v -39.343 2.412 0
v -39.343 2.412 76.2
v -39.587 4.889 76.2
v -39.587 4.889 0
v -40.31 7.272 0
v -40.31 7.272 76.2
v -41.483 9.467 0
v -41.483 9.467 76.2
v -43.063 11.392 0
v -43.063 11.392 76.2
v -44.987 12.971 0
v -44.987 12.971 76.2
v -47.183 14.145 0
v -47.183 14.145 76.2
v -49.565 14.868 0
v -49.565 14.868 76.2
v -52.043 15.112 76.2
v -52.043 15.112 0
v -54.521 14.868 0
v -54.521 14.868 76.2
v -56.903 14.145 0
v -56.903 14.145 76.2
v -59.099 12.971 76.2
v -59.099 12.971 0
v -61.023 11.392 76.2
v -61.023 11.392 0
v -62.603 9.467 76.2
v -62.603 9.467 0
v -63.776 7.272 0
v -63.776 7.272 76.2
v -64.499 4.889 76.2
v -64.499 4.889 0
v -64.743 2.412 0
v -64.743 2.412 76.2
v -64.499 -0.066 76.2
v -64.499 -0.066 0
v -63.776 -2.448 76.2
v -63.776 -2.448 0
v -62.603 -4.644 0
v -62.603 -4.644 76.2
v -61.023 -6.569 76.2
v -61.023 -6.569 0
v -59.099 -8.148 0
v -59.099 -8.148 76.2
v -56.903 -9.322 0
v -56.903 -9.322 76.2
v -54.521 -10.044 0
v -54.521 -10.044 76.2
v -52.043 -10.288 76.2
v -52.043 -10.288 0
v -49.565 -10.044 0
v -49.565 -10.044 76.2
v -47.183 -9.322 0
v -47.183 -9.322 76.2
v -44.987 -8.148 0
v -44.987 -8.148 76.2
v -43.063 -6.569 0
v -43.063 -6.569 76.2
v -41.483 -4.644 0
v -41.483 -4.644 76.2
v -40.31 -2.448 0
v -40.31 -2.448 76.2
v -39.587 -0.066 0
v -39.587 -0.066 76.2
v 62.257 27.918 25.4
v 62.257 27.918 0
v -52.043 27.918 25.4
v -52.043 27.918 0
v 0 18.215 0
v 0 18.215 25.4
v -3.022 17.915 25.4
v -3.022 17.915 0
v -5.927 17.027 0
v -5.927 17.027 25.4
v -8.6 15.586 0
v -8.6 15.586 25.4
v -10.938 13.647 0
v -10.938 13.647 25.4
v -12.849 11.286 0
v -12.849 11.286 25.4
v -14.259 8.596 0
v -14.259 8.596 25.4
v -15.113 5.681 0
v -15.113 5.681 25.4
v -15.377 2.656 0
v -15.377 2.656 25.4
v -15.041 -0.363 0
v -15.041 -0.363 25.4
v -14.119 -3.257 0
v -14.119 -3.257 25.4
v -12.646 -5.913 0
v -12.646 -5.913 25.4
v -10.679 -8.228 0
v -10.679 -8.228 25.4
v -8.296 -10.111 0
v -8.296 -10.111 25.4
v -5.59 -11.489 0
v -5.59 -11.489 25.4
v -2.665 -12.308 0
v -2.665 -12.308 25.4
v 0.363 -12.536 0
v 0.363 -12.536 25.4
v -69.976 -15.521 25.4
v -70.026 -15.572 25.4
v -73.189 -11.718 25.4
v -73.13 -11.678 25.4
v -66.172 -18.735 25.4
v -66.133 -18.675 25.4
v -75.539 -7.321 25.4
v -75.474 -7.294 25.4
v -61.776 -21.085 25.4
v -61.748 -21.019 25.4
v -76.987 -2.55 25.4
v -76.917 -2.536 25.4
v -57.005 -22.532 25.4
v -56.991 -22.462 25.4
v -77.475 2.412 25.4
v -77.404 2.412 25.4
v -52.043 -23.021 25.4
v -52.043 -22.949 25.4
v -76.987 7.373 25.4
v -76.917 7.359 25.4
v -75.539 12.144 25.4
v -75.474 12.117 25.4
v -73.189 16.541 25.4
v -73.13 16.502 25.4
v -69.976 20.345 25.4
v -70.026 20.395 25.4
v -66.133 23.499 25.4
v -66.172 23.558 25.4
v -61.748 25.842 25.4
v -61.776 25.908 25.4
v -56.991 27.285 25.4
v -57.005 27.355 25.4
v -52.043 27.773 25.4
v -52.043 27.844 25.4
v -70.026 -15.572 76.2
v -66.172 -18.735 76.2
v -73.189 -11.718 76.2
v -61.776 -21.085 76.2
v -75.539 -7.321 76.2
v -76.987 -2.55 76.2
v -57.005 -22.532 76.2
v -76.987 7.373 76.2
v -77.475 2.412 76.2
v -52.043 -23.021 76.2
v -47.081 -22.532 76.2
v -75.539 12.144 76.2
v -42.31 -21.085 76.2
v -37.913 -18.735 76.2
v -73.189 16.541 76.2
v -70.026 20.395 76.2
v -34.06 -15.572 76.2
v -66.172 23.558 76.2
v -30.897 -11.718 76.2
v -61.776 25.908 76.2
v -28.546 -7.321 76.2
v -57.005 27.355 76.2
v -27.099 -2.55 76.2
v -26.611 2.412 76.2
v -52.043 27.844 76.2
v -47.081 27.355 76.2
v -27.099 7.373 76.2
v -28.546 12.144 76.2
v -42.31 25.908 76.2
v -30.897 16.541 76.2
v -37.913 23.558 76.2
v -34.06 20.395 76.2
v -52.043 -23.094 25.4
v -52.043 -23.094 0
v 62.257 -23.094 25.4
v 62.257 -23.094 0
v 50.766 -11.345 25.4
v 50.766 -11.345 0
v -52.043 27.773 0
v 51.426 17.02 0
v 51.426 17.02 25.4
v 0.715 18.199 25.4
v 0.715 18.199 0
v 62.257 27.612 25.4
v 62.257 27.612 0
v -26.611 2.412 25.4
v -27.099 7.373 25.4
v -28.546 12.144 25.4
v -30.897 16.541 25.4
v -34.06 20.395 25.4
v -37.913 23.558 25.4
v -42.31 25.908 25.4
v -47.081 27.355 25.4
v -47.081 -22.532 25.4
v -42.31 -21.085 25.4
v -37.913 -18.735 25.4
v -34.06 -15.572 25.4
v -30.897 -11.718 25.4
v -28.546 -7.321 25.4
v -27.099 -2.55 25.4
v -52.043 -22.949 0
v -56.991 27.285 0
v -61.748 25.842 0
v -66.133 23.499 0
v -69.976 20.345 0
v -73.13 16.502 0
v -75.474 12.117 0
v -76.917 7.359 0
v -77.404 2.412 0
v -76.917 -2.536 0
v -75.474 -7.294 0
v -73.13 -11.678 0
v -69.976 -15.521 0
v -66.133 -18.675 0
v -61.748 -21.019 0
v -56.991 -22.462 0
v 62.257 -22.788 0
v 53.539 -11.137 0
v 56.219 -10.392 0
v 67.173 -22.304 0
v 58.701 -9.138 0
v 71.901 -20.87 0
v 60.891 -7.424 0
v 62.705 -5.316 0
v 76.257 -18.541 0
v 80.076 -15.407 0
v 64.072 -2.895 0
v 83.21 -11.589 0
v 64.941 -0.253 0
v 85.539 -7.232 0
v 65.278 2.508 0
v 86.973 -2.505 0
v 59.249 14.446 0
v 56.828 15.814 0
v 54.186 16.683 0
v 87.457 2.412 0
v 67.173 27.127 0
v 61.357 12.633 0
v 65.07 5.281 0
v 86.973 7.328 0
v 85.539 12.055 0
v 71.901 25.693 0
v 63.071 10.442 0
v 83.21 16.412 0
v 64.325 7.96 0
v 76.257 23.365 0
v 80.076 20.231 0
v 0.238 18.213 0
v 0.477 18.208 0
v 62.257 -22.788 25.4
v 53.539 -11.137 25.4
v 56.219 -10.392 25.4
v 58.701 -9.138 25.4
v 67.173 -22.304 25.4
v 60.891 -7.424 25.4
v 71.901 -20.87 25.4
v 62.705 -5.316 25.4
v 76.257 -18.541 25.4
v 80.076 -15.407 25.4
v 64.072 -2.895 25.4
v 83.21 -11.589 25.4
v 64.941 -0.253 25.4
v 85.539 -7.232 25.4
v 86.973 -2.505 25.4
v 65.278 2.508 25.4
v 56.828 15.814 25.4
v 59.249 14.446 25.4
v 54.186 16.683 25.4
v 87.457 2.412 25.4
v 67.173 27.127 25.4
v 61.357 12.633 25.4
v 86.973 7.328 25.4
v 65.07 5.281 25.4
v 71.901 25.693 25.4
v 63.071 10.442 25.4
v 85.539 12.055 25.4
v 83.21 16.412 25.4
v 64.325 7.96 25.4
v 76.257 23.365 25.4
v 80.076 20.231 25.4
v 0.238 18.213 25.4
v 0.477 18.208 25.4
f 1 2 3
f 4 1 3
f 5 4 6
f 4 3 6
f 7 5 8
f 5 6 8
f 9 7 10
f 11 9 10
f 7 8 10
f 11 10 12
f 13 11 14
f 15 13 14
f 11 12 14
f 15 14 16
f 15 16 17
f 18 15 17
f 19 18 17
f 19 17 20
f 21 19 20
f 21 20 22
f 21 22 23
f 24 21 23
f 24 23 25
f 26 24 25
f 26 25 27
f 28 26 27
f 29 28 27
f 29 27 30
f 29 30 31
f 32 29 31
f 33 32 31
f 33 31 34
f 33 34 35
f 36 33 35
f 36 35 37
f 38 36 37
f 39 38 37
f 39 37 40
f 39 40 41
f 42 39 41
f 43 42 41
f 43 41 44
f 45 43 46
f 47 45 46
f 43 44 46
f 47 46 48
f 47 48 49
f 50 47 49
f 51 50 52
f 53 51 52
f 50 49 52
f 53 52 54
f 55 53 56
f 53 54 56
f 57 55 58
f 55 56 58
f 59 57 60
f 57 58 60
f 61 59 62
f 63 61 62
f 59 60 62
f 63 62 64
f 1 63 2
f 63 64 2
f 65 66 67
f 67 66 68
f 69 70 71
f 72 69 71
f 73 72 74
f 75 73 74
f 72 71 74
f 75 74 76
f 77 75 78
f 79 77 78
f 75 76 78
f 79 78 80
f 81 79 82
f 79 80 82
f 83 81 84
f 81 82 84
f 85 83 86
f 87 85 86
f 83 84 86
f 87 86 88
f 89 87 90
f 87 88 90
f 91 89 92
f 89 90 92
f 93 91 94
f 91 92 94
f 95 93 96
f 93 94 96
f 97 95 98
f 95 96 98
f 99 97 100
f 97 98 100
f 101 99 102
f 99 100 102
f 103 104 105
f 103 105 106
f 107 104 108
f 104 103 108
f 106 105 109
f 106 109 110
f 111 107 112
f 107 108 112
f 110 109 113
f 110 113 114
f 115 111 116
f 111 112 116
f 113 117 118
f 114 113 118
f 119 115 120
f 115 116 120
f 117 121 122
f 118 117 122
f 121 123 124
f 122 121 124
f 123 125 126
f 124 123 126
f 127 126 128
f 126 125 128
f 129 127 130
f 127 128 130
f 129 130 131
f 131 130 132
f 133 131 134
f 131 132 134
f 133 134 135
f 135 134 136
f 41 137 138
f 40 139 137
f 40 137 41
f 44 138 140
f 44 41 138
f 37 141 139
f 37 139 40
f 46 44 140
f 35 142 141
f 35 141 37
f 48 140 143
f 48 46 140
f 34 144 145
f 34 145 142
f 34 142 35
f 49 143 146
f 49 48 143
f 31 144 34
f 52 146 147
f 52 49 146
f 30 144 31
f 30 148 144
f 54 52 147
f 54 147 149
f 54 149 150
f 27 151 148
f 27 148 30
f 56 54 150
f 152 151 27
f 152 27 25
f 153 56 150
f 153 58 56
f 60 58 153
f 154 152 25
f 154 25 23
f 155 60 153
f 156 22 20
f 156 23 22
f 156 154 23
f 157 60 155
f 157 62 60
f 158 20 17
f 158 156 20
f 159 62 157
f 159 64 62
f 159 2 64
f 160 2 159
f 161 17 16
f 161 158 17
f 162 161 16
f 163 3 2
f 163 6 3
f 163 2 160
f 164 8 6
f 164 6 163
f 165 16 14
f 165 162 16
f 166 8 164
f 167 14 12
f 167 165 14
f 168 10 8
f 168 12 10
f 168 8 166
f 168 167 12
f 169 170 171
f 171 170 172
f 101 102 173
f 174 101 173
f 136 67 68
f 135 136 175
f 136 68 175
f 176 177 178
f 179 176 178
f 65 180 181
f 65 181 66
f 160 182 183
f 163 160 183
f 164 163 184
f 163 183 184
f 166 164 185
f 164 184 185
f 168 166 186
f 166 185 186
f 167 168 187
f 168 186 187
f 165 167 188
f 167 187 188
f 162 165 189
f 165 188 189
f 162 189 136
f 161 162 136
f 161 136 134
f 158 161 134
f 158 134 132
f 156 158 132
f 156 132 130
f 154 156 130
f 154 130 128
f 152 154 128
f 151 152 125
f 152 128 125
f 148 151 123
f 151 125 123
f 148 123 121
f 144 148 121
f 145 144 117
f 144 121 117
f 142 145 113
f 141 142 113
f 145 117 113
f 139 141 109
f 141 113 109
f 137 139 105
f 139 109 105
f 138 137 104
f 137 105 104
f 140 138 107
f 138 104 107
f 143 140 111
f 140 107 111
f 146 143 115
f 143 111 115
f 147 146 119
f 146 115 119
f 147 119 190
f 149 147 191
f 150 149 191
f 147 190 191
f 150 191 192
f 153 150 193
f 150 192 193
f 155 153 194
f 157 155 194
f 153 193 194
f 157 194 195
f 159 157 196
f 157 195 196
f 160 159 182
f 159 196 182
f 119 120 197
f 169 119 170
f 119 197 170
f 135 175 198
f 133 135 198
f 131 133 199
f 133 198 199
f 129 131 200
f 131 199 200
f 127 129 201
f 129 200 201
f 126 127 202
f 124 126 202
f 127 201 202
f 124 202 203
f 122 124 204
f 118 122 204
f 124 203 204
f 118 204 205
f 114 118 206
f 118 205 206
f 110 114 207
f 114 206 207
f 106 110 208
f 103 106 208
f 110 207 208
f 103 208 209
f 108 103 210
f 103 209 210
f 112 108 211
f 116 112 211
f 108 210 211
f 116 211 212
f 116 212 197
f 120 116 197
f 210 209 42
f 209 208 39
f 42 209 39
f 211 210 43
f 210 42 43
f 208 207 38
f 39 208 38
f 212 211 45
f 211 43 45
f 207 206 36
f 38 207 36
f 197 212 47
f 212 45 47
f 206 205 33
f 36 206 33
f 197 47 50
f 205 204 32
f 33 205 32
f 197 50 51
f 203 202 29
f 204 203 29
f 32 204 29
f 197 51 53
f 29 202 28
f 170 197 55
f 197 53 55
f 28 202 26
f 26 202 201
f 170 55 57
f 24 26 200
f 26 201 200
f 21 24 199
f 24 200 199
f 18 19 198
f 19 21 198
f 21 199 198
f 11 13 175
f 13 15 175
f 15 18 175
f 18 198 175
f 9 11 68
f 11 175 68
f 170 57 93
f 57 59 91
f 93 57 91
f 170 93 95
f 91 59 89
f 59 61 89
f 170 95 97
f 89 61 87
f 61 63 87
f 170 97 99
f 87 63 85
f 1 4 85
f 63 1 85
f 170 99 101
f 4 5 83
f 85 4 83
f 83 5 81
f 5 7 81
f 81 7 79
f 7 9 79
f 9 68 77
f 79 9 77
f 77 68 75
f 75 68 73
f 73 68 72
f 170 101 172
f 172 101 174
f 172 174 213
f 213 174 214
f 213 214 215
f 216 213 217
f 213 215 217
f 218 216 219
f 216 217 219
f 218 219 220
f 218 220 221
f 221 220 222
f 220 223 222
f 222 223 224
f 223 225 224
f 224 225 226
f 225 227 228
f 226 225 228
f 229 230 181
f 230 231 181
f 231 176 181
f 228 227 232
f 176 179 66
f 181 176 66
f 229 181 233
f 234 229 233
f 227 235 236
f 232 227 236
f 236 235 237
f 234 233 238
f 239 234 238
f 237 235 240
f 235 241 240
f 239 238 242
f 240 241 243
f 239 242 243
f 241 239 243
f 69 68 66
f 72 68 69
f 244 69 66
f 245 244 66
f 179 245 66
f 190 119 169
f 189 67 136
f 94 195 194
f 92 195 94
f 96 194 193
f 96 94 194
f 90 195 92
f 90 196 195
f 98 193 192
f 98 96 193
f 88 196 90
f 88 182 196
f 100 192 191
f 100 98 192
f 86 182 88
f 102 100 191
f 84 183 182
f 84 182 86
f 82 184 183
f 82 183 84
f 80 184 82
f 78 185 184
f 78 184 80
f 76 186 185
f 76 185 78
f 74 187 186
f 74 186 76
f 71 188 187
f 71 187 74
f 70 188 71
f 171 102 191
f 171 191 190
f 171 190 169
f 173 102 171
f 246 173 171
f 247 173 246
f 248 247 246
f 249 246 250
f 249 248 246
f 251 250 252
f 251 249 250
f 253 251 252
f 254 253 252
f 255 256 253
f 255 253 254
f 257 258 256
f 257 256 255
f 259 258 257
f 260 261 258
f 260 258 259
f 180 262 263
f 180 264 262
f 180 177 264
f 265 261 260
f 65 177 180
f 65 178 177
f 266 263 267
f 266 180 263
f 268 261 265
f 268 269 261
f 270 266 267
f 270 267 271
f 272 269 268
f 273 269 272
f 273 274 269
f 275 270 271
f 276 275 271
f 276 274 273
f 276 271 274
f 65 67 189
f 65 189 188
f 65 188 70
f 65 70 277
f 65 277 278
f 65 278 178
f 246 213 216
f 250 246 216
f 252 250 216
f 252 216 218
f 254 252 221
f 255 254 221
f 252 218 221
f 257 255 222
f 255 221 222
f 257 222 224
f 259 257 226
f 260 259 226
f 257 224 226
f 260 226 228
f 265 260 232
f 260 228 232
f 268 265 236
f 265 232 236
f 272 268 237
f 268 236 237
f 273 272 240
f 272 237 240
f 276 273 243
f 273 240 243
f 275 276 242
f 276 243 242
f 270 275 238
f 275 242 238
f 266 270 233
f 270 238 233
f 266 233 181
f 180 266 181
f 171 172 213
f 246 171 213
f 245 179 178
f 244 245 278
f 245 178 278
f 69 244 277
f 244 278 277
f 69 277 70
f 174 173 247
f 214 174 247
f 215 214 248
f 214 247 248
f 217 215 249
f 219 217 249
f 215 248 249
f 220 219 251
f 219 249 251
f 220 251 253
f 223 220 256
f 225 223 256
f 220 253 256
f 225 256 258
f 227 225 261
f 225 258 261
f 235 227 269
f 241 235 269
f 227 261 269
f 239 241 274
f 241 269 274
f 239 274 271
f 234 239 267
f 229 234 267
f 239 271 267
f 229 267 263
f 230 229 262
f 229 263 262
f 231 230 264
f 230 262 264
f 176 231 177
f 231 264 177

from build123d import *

# Parameters (mm, degrees)
F1_DEPTH = 25.4
F2_R     = 25.43243
F3_DEPTH = 50.8
F4_R     = 12.7
F5_DEPTH = 177.8
F7_DEPTH = 203.2


with BuildPart() as f1:
    # F0 (on Top) → F1 (new body)
    with BuildSketch(Plane.XY):
        with BuildLine():
            Line((62.257019, 27.917736), (-52.042981, 27.917736))
            Line((-52.042981, 27.917736), (-52.042981, 27.772728))
            ThreePointArc((-52.042981, 27.772728), (-77.40406, 2.411649), (-52.042981, -22.94943))
            Line((-52.042981, -22.94943), (-52.042981, -23.094439))
            Line((-52.042981, -23.094439), (62.257019, -23.094439))
            Line((62.257019, -23.094439), (62.257019, -22.788397))
            ThreePointArc((62.257019, -22.788397), (87.457065, 2.411649), (62.257019, 27.611695))
            Line((62.257019, 27.611695), (62.257019, 27.917736))
        make_face()
    extrude(amount=F1_DEPTH)

    # F2 (on face) → F3 (join)
    with BuildSketch(Plane.XY.offset(25.4)):
        with Locations((-52.042981, 2.411649)):
            Circle(F2_R)
    extrude(amount=F3_DEPTH)

    # F4 (on face) → F5 (cut)
    with BuildSketch(Plane.XY.offset(76.2)):
        with Locations((-52.042981, 2.411649)):
            Circle(F4_R)
    extrude(amount=-F5_DEPTH, mode=Mode.SUBTRACT)

    # F6 (on face) → F7 (cut)
    with BuildSketch(Plane.XY.offset(25.4)):
        with BuildLine():
            Line((0, 18.215184), (0.714671, 18.198568))
            ThreePointArc((0.714671, 18.198568), (0.357432, 18.211029), (0, 18.215184))
        make_face()
        with BuildLine():
            Line((51.425615, 17.019568), (0.714671, 18.198568))
            Line((0.714671, 18.198568), (0, 18.215184))
            ThreePointArc((0, 18.215184), (-15.376876, 2.655535), (0.363372, -12.536422))
            Line((0.363372, -12.536422), (50.766153, -11.345099))
            ThreePointArc((50.766153, -11.345099), (65.278218, 2.507503), (51.425615, 17.019568))
        make_face()
    extrude(amount=-F7_DEPTH, mode=Mode.SUBTRACT)


solid = f1.part
